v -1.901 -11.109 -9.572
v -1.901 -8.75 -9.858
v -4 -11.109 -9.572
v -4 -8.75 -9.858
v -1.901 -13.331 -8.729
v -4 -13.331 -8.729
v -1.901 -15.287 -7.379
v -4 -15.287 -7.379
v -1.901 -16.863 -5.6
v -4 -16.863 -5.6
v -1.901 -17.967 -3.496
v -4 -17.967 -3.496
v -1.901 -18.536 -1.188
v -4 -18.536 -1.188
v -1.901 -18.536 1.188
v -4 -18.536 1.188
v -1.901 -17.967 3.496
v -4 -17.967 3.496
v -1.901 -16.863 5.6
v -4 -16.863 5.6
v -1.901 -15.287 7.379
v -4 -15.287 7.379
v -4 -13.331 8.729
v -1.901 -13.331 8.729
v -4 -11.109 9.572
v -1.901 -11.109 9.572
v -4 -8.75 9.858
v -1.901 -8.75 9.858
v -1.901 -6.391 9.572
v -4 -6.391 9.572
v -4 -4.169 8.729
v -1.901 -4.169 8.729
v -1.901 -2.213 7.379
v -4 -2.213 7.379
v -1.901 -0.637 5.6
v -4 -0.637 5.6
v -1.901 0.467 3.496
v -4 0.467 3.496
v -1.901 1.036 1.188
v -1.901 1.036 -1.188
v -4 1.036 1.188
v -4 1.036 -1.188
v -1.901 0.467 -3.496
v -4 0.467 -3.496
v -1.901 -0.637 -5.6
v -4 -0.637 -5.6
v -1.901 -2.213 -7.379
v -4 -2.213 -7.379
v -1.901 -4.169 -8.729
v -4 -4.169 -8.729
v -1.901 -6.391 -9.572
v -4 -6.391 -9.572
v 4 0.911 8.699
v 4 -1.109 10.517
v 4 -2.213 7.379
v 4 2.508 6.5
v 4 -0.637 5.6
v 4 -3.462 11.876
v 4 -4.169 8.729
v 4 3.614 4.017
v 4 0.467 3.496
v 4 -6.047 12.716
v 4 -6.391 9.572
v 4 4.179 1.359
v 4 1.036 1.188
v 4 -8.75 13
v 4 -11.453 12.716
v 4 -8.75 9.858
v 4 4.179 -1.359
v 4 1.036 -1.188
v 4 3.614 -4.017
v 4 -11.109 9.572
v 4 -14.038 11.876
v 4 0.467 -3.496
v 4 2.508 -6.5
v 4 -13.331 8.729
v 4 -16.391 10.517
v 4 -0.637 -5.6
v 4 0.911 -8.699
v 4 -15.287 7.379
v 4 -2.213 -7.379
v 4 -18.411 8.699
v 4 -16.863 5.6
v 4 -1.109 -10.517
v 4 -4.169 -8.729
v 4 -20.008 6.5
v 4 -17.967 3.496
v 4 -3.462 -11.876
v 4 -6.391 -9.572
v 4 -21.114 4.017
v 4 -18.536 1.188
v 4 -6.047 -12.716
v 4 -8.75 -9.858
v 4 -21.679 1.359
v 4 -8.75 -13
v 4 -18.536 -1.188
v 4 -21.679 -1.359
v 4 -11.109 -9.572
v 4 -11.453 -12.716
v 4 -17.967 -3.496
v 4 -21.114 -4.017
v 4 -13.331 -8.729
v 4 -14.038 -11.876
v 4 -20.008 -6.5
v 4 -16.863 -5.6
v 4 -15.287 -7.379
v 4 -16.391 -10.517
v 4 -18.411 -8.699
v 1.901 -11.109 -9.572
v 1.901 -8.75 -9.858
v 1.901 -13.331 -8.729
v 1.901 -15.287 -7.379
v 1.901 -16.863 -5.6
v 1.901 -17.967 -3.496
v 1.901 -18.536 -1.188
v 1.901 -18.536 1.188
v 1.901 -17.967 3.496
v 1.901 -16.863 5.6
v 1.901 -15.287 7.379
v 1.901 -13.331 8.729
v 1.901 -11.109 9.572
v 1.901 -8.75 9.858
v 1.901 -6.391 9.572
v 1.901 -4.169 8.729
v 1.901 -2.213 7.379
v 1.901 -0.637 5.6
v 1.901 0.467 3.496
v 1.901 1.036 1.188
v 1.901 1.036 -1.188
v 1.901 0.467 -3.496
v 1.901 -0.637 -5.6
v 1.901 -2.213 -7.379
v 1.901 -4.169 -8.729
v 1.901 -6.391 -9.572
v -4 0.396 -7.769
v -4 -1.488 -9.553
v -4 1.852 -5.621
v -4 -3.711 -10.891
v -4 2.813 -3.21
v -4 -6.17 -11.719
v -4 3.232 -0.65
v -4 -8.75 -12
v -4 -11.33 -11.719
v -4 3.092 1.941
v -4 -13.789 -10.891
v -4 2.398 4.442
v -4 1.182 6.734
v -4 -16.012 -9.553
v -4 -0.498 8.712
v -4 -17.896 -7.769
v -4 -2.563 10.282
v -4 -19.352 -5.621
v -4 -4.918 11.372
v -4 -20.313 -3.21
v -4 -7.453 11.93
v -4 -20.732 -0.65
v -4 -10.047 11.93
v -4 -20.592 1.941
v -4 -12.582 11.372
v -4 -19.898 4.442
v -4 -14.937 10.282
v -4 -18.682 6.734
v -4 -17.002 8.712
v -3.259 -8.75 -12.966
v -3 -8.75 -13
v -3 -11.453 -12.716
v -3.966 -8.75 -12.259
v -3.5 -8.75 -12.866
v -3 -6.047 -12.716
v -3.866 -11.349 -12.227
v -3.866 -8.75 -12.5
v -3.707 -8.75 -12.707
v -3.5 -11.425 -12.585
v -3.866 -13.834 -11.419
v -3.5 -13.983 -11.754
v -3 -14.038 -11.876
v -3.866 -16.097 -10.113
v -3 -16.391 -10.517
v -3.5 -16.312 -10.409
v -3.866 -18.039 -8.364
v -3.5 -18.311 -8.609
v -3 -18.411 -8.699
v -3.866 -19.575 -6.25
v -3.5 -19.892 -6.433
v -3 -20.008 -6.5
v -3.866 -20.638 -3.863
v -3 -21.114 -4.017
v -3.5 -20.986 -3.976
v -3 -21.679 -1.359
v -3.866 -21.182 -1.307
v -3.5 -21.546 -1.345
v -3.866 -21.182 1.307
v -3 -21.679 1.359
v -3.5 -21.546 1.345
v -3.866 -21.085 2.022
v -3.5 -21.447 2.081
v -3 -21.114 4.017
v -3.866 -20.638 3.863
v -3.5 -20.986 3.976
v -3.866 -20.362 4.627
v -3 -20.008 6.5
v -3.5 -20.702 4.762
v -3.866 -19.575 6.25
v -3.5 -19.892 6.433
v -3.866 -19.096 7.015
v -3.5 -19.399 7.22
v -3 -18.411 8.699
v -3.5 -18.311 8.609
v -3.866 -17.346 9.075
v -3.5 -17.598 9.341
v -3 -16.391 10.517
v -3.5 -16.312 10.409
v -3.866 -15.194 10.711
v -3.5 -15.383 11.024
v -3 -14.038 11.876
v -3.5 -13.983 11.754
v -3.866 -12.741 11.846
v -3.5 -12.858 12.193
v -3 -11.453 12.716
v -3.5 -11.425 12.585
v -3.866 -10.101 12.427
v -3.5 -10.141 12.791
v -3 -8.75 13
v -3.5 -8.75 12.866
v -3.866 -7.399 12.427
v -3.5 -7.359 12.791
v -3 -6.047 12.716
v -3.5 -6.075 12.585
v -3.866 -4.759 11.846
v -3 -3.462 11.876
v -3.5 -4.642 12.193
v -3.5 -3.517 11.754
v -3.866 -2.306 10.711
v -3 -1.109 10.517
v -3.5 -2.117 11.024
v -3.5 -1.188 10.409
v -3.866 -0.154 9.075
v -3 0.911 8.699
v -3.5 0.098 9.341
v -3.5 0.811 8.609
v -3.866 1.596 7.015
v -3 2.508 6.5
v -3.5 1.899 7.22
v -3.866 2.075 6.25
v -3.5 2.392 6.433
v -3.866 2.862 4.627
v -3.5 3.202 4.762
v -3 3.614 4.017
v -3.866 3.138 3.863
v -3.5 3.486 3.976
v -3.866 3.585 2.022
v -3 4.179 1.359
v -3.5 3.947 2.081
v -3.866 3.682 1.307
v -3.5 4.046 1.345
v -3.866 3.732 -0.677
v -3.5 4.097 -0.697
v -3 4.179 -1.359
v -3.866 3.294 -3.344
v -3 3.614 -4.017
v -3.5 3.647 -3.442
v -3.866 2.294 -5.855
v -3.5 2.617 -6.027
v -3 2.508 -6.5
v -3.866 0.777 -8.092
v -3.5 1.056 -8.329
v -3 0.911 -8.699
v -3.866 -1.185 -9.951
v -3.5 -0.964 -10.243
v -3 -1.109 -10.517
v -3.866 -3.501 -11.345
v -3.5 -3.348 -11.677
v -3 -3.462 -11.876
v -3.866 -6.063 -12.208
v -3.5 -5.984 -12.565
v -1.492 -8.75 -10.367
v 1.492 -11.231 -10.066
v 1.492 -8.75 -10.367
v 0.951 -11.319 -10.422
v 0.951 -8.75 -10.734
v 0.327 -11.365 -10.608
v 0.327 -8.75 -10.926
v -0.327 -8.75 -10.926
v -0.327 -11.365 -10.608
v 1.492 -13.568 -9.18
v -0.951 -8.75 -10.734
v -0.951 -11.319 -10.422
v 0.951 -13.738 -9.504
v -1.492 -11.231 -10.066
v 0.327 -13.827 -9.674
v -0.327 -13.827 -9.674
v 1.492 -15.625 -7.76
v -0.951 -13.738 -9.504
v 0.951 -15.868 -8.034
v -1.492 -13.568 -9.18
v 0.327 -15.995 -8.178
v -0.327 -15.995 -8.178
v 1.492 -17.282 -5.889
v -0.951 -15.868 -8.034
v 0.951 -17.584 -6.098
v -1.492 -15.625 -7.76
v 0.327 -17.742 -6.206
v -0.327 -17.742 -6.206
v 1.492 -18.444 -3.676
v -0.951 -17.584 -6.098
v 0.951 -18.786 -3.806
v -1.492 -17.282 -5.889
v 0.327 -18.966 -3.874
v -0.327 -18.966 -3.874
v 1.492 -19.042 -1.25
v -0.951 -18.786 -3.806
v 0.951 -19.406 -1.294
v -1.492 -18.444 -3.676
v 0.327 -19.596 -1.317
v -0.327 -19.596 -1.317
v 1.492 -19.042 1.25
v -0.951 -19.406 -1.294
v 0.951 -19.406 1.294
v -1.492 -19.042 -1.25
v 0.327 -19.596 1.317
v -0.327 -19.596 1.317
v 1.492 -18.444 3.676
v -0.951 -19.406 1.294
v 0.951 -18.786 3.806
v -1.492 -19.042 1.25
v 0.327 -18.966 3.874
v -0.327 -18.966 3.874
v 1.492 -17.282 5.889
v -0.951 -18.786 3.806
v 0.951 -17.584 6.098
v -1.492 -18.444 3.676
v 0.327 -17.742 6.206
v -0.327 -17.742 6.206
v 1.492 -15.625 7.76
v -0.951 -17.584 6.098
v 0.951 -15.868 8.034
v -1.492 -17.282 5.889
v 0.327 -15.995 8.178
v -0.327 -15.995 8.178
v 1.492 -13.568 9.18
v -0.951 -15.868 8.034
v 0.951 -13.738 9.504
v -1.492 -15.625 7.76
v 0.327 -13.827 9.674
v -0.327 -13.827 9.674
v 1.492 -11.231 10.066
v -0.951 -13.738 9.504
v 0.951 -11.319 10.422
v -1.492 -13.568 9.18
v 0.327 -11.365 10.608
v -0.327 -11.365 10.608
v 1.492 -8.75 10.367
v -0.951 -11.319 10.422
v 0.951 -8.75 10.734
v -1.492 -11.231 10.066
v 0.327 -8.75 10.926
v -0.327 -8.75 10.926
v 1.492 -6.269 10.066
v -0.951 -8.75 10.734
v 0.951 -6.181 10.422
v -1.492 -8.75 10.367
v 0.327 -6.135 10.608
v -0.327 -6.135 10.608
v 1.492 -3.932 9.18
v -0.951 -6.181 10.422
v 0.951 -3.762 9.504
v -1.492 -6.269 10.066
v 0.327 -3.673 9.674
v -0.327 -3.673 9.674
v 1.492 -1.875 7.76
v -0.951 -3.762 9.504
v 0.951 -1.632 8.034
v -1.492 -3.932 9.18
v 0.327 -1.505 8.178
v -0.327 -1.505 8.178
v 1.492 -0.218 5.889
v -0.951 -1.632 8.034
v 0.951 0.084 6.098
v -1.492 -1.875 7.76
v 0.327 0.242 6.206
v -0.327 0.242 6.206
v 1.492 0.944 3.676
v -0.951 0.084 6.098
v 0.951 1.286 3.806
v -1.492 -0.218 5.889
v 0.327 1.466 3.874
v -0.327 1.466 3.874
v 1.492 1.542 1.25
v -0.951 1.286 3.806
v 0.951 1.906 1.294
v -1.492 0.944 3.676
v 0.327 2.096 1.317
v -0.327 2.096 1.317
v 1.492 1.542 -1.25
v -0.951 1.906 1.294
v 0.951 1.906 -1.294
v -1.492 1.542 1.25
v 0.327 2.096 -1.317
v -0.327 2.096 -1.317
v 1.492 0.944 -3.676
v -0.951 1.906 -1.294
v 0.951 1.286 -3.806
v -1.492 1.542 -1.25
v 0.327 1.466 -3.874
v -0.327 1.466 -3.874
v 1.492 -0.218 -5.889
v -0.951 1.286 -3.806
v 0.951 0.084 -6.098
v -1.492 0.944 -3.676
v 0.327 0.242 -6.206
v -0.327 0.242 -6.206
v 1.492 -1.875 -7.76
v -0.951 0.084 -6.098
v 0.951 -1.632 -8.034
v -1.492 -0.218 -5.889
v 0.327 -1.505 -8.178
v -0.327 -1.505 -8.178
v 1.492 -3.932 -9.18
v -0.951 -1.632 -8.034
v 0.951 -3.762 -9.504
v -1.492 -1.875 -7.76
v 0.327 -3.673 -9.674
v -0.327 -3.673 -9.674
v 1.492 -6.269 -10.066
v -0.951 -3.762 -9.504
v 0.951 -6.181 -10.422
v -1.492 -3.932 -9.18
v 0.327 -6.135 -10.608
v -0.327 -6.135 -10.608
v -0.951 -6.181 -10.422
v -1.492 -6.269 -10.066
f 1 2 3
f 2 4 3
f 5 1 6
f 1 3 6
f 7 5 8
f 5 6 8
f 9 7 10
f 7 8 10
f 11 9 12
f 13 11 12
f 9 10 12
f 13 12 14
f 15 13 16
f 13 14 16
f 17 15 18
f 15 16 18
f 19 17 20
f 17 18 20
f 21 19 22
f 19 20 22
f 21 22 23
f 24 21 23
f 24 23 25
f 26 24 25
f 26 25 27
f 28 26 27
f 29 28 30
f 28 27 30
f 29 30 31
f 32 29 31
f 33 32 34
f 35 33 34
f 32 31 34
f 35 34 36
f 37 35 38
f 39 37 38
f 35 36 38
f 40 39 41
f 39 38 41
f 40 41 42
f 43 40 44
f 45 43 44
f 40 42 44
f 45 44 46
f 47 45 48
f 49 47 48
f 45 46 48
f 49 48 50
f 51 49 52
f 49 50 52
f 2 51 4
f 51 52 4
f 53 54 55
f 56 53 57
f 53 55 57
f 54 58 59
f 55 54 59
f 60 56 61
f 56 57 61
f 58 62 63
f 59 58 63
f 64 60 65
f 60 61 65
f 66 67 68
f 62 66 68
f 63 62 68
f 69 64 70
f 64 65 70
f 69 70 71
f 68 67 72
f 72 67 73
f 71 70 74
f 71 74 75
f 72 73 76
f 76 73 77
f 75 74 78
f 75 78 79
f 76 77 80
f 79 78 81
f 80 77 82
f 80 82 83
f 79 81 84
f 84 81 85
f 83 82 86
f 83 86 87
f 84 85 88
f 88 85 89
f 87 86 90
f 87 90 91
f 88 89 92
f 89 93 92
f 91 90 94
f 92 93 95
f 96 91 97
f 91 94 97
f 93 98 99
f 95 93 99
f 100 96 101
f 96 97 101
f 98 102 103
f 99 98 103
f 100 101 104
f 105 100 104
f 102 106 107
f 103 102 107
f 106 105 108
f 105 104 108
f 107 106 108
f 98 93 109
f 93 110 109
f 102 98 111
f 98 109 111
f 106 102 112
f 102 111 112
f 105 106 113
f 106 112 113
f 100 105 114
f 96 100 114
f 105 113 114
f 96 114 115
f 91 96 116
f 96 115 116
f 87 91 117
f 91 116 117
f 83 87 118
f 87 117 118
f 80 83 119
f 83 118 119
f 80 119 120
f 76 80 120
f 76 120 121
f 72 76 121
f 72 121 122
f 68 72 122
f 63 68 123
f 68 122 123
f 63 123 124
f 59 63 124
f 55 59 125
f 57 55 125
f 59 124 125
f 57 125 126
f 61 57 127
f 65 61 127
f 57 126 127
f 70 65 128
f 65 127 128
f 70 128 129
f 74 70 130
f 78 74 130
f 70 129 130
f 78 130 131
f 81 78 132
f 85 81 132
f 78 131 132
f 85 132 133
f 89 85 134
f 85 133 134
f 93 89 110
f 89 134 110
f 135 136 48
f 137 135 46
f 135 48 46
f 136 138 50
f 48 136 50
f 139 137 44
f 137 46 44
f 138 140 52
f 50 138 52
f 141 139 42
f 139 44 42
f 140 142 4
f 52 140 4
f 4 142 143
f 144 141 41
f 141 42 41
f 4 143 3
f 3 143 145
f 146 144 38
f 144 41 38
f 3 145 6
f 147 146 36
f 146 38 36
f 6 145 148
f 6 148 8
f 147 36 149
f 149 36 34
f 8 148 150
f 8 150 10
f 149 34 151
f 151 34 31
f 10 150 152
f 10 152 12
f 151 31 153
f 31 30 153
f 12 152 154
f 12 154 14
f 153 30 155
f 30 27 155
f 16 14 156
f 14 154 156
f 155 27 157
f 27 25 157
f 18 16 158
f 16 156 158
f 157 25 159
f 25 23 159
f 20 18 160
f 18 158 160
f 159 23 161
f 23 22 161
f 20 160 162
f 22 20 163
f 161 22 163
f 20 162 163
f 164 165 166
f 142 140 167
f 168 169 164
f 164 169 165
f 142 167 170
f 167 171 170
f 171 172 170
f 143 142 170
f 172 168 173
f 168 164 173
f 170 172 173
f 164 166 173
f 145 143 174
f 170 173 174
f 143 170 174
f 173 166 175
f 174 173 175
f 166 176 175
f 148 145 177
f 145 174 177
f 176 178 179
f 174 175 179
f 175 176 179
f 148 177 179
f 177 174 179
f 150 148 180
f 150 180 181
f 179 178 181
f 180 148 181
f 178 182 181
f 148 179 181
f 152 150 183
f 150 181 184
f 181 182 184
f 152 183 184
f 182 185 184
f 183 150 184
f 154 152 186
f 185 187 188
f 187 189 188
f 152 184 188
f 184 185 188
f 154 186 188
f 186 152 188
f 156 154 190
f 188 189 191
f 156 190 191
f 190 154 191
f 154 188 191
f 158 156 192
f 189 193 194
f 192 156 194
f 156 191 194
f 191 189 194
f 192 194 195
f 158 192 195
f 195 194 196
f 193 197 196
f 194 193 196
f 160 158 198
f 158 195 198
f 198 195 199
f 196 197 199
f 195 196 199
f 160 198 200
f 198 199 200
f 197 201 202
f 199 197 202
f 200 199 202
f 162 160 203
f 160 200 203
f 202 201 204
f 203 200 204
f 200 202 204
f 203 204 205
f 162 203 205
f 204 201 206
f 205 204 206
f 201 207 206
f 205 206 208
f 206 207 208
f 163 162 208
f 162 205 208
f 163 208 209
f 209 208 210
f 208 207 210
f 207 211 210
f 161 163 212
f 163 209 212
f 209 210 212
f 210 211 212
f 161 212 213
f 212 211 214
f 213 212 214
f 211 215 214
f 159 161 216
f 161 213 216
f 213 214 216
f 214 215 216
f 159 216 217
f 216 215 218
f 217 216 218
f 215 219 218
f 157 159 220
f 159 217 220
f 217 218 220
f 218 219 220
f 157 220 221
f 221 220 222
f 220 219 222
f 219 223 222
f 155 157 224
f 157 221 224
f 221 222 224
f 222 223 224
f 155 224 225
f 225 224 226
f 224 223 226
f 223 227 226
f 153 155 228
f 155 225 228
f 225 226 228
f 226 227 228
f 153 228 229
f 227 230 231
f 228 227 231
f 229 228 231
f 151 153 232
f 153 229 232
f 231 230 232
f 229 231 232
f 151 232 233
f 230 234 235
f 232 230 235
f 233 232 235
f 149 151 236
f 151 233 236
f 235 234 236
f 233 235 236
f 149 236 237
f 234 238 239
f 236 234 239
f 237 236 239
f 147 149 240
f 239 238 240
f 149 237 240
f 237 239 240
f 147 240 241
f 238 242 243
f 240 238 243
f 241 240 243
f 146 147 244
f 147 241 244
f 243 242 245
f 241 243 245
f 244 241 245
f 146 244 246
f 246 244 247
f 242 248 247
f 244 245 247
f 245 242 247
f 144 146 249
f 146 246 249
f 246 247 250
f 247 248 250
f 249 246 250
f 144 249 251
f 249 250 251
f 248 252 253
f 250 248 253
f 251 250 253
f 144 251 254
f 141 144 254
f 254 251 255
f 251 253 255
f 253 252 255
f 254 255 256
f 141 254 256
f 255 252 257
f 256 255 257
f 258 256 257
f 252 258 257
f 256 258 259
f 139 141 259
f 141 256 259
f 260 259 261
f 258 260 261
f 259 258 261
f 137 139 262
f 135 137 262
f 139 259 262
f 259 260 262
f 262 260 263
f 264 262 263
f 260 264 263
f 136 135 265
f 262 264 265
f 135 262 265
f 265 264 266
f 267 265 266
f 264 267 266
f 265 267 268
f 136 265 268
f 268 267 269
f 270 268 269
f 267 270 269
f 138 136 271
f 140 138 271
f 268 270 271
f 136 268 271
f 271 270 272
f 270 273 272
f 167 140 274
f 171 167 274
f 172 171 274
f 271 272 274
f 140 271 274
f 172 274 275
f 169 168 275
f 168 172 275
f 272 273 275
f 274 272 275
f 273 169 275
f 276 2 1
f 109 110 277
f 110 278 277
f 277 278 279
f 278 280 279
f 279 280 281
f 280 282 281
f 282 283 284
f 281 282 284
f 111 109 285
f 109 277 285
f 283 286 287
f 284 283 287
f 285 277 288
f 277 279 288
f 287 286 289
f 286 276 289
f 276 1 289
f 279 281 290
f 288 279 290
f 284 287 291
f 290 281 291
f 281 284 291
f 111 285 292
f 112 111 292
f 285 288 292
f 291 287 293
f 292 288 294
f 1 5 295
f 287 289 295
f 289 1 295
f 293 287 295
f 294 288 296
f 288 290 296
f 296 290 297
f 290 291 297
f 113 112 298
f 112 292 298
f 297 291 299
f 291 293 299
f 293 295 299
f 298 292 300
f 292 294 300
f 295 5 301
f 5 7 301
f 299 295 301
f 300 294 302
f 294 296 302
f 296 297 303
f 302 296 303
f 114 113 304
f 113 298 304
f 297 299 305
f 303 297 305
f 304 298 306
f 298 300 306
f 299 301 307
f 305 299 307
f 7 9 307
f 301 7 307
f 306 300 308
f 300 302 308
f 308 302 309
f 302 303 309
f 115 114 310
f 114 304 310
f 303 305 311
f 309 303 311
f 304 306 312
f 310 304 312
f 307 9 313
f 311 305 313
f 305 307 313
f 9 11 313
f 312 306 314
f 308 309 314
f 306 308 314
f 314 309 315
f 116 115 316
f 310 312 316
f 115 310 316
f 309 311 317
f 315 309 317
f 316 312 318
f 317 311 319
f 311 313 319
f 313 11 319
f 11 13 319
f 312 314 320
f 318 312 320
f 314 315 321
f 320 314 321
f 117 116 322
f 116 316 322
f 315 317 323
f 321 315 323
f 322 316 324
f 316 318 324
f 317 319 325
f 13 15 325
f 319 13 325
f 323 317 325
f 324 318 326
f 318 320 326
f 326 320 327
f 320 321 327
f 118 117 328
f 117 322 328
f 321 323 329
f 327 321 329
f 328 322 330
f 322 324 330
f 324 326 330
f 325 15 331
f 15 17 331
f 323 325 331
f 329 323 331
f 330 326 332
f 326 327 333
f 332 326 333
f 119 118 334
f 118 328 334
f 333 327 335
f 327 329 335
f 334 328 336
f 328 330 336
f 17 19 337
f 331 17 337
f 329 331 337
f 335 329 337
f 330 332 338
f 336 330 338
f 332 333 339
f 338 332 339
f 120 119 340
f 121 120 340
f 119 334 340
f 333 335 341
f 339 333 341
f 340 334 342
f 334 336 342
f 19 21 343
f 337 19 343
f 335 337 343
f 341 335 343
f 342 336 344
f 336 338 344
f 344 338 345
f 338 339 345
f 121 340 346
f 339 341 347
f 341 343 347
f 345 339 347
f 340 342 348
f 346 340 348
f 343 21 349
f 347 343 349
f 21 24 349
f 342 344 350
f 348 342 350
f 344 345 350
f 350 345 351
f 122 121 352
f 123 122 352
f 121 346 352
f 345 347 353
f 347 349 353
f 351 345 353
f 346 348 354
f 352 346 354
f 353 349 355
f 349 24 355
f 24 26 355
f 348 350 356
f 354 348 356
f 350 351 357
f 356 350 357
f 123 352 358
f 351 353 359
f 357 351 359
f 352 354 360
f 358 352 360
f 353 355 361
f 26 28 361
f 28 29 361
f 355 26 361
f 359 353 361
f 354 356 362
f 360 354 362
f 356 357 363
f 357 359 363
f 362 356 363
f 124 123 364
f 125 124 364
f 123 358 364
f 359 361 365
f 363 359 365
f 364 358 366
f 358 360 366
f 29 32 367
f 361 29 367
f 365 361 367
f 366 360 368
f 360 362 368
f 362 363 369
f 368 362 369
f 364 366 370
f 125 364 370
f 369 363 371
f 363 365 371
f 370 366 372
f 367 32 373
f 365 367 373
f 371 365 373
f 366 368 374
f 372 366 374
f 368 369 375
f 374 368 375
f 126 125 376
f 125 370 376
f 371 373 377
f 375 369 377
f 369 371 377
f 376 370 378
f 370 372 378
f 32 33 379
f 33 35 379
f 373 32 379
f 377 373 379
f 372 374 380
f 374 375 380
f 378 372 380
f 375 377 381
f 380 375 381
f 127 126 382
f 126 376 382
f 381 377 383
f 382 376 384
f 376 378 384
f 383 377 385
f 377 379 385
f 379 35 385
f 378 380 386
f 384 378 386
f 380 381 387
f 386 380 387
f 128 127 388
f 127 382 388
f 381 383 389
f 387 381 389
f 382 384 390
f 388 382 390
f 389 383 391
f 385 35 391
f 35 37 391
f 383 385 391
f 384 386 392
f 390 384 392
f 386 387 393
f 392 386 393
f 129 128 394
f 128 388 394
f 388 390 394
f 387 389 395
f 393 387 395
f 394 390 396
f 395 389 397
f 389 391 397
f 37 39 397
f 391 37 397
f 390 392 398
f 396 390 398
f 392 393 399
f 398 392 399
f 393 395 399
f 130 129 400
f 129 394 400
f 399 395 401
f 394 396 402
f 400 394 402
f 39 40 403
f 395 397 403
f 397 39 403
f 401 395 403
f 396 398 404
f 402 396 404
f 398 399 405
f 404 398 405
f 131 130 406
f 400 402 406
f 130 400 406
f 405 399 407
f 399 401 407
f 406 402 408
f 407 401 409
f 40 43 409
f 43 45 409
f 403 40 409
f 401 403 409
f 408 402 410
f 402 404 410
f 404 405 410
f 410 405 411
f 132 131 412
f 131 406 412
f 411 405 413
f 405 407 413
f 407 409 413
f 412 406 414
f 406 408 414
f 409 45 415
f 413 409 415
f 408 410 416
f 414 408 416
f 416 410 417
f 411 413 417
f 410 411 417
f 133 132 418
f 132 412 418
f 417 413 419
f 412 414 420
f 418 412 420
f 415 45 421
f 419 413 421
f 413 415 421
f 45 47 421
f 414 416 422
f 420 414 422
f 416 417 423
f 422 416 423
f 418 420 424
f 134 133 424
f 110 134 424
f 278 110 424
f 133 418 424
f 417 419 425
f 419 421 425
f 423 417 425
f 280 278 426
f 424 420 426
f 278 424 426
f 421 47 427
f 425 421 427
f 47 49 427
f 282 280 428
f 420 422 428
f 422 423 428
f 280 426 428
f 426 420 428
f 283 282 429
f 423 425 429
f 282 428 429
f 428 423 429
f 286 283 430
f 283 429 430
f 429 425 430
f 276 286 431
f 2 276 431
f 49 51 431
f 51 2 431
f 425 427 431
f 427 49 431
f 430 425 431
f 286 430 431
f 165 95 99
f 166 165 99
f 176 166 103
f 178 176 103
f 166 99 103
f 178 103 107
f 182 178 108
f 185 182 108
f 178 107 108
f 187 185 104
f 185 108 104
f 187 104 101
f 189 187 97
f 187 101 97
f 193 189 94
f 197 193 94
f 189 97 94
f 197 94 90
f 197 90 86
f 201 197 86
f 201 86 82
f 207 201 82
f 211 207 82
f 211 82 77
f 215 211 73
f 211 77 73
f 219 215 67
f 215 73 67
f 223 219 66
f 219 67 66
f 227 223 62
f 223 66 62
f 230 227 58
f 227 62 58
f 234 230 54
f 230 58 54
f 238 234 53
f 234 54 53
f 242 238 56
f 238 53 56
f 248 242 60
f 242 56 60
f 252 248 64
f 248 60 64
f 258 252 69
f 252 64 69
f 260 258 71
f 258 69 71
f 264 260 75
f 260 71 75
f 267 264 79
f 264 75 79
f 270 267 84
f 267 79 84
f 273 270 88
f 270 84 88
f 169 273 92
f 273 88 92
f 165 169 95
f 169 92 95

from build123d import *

# Parameters (mm, degrees)
FILLET1_R = 1


with BuildPart() as part:
    # Sketch1 → Revolve1 (revolve)
    with BuildSketch(Plane.XY, mode=Mode.PRIVATE) as revolve1_sk:
        with BuildLine():
            Line((0, 4.25), (4, 4.25))
            Line((4, 4.25), (4, 1.108))
            Line((4, 1.108), (1.900614637, 1.108))
            ThreePointArc((1.900614637, 1.108), (0, 2.2), (-1.900614637, 1.108))
            Line((-1.900614637, 1.108), (-4, 1.108))
            Line((-4, 1.108), (-4, 4.25))
            Line((-4, 4.25), (0, 4.25))
        make_face()
    revolve(revolve1_sk.sketch.rotate(Axis((4, -8.75, 0), (-1, 0, 0)), 90), axis=Axis((4, -8.75, 0), (-1, 0, 0)))

    # Fillet1
    fillet1_edges = [part.edges().sort_by_distance(p)[0] for p in [
        (-4, -8.75, 13),
    ]]
    fillet(fillet1_edges, radius=FILLET1_R)


solid = part.part
